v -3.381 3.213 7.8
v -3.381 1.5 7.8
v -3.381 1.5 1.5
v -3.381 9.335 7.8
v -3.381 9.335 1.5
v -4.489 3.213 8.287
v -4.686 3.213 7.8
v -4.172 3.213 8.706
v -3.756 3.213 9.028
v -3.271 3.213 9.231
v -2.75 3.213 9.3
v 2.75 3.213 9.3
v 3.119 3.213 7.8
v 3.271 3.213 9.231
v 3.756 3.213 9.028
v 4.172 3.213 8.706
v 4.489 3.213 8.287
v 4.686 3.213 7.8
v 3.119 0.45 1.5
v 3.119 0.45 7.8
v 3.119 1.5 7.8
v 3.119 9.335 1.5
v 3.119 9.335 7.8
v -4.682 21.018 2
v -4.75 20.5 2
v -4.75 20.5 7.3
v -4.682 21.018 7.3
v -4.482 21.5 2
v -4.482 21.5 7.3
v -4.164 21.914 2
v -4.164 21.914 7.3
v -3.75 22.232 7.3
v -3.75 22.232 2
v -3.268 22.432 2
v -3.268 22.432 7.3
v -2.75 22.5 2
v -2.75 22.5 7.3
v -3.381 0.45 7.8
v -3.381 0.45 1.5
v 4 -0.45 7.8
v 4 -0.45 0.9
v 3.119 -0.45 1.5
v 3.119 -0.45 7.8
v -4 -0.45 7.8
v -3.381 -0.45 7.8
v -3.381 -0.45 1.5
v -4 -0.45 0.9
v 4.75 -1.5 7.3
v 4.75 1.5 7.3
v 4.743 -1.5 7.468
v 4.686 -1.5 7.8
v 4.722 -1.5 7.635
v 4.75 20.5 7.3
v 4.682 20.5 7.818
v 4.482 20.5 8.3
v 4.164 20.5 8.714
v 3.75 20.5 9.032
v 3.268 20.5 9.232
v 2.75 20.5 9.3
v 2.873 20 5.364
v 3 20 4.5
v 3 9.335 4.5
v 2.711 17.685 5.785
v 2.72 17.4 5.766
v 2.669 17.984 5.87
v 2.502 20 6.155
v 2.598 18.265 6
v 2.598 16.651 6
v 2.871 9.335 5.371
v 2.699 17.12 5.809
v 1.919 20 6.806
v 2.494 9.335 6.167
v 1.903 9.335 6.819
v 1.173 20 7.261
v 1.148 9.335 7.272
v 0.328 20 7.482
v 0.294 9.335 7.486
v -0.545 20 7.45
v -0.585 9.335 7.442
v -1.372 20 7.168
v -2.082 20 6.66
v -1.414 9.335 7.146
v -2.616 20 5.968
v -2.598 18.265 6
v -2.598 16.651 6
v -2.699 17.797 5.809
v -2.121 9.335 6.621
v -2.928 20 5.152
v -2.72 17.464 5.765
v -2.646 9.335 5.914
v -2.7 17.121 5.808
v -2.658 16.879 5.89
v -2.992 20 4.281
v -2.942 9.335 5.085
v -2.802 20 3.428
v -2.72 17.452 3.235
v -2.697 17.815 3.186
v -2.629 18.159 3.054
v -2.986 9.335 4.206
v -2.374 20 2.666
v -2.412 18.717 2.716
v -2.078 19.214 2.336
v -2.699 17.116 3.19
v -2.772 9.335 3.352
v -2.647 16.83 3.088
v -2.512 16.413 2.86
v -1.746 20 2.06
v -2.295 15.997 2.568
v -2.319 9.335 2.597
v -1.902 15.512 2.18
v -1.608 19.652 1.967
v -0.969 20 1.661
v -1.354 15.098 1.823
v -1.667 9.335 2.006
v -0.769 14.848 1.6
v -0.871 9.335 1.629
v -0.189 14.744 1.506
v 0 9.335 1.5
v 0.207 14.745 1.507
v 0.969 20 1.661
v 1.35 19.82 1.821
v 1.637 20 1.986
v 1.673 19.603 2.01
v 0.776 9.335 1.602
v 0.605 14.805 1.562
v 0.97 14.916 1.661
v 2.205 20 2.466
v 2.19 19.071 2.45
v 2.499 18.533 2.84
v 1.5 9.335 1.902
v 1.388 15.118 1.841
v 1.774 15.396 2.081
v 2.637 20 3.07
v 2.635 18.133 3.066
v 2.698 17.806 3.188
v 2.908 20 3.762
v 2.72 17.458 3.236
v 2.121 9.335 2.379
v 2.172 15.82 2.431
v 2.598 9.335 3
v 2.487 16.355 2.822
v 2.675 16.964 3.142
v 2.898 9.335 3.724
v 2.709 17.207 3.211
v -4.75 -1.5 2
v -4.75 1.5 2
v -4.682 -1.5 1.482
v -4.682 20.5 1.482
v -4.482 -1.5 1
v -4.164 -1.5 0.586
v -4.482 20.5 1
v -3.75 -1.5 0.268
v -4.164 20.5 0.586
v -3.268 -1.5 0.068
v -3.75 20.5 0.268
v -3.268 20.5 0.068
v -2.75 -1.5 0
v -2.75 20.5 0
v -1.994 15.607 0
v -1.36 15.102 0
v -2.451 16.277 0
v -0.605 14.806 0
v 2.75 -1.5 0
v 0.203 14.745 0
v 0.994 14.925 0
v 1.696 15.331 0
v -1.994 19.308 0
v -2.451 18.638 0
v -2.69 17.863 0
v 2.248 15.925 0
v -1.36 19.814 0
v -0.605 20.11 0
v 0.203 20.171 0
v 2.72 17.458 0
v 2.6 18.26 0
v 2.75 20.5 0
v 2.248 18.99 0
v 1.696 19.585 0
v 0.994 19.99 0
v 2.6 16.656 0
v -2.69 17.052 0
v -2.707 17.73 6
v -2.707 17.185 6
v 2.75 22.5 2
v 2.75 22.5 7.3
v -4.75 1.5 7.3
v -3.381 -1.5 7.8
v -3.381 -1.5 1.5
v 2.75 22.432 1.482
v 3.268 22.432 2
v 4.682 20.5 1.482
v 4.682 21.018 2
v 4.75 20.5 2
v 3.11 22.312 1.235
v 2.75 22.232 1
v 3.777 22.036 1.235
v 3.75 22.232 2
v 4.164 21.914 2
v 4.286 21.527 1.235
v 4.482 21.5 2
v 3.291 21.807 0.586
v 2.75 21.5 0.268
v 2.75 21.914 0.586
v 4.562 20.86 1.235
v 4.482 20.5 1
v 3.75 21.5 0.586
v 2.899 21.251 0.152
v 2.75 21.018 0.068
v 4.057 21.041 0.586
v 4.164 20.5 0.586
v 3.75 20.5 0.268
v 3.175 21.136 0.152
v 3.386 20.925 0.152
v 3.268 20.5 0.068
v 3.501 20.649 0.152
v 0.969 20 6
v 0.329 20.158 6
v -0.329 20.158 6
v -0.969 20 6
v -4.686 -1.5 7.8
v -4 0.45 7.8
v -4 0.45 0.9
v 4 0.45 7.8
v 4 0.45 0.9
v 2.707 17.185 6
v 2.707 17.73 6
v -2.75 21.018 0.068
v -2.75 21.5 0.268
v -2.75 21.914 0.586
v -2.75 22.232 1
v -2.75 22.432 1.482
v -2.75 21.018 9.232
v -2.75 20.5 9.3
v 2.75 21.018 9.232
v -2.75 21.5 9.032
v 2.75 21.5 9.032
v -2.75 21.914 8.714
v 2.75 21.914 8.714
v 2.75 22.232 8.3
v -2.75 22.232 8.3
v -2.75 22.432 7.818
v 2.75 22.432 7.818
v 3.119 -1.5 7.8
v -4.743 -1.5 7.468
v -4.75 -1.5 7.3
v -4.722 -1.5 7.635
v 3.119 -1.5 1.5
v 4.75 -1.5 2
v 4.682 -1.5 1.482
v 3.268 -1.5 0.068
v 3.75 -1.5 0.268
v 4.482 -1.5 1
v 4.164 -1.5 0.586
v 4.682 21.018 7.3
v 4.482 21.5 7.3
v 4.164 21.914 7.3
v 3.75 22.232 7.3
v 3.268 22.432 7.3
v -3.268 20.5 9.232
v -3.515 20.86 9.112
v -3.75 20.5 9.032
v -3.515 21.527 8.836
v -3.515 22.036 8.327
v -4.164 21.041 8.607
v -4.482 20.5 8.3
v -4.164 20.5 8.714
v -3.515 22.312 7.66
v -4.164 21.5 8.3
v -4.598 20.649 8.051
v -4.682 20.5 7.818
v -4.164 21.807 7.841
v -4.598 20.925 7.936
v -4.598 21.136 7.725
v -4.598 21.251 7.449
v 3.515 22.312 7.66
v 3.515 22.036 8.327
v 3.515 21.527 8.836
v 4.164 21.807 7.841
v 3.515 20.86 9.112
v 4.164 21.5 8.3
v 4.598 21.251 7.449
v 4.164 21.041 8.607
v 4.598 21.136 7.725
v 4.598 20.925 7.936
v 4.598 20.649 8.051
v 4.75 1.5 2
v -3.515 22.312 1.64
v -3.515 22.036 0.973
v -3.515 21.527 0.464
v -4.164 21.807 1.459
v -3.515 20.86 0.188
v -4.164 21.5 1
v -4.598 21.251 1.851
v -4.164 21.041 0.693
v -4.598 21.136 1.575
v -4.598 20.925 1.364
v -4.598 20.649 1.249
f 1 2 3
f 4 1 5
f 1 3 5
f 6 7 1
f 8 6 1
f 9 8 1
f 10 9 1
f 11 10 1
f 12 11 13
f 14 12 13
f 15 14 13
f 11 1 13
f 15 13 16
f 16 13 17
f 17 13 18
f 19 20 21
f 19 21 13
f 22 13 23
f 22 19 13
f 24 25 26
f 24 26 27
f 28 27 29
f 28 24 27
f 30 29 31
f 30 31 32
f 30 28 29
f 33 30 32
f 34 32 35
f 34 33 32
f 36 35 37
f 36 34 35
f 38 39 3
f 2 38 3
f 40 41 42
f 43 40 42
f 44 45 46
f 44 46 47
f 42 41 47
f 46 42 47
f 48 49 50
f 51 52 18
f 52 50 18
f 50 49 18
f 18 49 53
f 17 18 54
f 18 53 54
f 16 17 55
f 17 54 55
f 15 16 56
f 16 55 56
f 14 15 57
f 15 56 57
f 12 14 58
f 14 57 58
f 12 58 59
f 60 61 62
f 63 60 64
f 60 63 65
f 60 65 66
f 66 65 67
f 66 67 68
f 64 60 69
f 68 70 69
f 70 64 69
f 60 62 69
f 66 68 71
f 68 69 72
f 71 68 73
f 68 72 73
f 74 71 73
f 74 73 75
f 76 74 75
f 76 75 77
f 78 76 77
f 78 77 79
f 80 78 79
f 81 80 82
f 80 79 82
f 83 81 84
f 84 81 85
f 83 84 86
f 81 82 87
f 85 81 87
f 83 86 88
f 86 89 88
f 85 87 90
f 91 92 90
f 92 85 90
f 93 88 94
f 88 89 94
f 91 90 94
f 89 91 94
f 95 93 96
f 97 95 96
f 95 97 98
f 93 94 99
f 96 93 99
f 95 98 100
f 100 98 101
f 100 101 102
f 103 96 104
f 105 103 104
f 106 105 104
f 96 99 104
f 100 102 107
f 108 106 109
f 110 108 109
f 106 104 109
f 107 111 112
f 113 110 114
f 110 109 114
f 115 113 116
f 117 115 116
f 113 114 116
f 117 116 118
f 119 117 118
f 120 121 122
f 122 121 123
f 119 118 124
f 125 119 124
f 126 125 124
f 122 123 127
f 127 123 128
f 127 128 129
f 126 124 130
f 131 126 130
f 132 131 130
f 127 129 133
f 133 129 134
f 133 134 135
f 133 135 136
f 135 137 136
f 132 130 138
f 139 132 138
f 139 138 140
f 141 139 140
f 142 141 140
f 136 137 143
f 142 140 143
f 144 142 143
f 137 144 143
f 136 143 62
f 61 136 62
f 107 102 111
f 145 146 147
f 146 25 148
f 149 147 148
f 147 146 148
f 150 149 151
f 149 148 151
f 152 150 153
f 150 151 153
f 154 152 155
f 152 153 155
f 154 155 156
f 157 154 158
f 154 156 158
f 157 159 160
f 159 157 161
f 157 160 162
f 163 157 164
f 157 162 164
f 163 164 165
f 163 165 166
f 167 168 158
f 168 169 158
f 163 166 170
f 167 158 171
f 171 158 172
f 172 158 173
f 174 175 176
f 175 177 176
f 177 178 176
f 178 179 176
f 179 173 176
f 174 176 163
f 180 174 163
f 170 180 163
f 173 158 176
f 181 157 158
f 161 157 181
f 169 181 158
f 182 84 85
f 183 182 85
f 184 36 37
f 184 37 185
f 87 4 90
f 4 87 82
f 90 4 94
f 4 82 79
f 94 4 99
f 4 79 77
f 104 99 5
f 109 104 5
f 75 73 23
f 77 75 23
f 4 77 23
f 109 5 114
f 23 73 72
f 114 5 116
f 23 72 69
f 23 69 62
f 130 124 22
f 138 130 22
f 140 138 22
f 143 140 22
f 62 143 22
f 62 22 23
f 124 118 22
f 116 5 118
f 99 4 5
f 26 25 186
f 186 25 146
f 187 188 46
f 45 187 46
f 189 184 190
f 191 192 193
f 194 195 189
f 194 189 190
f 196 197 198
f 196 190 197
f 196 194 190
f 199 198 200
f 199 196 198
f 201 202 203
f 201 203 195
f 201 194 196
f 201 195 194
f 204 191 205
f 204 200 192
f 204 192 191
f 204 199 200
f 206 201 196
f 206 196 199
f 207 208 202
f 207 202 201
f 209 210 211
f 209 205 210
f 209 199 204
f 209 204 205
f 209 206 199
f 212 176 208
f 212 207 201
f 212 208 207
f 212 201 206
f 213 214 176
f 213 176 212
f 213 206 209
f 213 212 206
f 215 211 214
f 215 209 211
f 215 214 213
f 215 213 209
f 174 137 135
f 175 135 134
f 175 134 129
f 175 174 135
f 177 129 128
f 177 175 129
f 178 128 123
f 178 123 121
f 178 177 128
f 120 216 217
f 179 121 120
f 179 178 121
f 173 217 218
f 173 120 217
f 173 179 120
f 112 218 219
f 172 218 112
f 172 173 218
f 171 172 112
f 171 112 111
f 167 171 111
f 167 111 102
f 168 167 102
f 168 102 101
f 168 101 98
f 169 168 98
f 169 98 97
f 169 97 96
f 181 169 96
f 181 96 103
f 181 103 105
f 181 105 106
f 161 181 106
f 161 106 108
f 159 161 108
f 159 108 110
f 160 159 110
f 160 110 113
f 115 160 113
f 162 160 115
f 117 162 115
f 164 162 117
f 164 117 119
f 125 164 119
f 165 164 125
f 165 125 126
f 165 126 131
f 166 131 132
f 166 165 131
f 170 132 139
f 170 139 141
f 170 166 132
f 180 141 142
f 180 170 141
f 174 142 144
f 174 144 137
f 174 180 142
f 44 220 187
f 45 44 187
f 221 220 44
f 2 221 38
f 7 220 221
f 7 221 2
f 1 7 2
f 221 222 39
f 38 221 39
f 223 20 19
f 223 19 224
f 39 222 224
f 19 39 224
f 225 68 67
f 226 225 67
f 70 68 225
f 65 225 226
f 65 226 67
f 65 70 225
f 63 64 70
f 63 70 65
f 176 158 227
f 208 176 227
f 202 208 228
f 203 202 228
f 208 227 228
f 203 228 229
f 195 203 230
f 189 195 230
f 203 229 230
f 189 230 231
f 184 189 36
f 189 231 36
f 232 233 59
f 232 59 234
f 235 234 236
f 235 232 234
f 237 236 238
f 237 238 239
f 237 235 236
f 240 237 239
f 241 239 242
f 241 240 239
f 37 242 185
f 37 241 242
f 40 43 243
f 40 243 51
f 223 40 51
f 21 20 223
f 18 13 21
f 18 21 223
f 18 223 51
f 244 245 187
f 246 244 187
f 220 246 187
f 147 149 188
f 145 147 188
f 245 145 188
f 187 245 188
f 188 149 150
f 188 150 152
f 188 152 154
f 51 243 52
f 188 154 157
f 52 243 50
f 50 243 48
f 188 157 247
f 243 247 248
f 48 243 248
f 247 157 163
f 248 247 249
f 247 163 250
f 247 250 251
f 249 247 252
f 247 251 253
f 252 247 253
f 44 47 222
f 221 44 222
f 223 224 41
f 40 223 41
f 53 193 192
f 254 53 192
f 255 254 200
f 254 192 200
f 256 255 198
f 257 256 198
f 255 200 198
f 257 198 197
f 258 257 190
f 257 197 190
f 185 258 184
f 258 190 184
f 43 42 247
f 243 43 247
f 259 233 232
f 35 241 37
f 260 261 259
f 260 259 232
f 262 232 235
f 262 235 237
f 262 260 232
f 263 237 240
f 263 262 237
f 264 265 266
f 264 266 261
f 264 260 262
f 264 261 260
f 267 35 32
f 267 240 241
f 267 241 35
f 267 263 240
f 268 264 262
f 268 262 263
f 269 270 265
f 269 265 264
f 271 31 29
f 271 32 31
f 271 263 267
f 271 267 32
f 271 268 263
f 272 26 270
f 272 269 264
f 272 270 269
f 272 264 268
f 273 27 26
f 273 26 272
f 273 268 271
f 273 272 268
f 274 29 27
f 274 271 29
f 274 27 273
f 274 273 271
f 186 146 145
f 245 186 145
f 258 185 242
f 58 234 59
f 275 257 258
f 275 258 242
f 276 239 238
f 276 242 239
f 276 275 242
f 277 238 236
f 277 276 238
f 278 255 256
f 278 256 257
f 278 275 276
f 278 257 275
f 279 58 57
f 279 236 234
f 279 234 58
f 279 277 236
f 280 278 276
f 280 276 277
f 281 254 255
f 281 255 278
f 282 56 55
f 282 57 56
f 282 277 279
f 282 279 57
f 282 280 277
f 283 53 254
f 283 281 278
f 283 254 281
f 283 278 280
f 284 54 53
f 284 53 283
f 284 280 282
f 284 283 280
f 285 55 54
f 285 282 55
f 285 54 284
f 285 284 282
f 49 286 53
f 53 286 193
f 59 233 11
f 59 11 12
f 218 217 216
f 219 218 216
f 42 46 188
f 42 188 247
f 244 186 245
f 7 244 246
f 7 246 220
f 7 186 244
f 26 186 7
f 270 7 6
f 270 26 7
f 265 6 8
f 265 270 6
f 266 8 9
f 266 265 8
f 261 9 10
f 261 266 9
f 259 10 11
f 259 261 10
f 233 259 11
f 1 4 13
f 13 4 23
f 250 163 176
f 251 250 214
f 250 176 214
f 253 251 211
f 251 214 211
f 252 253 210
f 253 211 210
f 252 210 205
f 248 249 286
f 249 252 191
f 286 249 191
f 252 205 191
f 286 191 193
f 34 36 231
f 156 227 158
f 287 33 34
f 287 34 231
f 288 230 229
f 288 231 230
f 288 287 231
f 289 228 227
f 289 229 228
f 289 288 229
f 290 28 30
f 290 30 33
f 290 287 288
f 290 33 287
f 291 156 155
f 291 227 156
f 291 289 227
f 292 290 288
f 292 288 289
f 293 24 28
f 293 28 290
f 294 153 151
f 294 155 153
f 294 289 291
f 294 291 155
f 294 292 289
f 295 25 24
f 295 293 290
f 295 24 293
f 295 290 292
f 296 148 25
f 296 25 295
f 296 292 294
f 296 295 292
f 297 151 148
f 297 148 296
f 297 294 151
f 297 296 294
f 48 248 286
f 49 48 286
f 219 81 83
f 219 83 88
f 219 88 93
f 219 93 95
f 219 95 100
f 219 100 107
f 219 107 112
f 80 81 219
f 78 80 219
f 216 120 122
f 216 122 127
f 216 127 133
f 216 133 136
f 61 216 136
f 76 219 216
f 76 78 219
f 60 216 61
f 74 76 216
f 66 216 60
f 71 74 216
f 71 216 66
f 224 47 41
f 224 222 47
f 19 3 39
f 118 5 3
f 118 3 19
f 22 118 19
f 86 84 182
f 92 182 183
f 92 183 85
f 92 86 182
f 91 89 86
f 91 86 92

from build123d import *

# Parameters (mm, degrees)
F0_W         = 1.3692331631
F0_H         = 7.834737435
F0_W_2       = 6.5
F0_H_2       = 0.9
F0_W_3       = 0.6192331631
F0_H_3       = 1.05
F0_H_4       = 13.165262565
F0_W_4       = 0.8807668369
F0_W_5       = 1.6307668369
F1_DEPTH     = 0.9
F2_DEPTH     = 1.5
F3_DEPTH     = 7.8
F5_W         = 9.5
F5_H         = 19.2867757659
F6_DEPTH     = 1.5
F7_R         = 3
F8_DEPTH     = 20
F9_T1_DEPTH  = 5.3
F9_T3_DEPTH  = 5.5
F9_T5_DEPTH  = 22.2867757659
F9_T7_DEPTH  = 27
F9_S11_W     = 2
F9_S11_H     = 2
F9_T12_DEPTH = 2
F9_S17_W     = 2
F9_S17_H     = 2
F9_T18_DEPTH = 2
F9_S23_W     = 2
F9_S23_H     = 2
F9_T24_DEPTH = 2
F9_S29_W     = 2
F9_S29_H     = 2
F9_T30_DEPTH = 2
F10_R        = 2.7204865104
F11_DEPTH    = 6


# Not quite as in the source:
# - a fillet or chamfer that OpenCascade refuses, or shapes differently, is made with other operations: its cross-section is extruded or revolved along the edge and cut away or added
# - a feature names something its author has since deleted; it is built from what else it names


with BuildPart() as f1:
    # F0 (on Top) → F1 (new body)
    with BuildSketch(Plane.XY):
        Polygon((-4.75, 1.5), (-4.75, -1.5), (-3.3807668369, -1.5), (-3.3807668369, -0.45), (-4, -0.45), (-4, 0.45), (-3.3807668369, 0.45), (-3.3807668369, 1.5), align=None)
        Polygon((-3.3807668369, -0.45), (-3.3807668369, -1.5), (-3.1192331631, -1.5), (3.1192331631, -1.5), (3.1192331631, -0.45), align=None)
        with Locations((-4.0653834185, 5.4173687175)):
            Rectangle(F0_W, F0_H)
        with Locations((-0.1307668369, 0)):
            Rectangle(F0_W_2, F0_H_2)
        with Locations((-3.6903834185, 0)):
            Rectangle(F0_W_3, F0_H_2)
        with Locations((-0.1307668369, 5.4173687175)):
            Rectangle(F0_W_2, F0_H)
        with Locations((-0.1307668369, 0.975)):
            Rectangle(F0_W_2, F0_H_3)
        with Locations((-4.0653834185, 15.9173687175)):
            Rectangle(F0_W, F0_H_4)
        Polygon((3.1192331631, -0.45), (3.1192331631, -1.5), (3.3807668369, -1.5), (4.75, -1.5), (4.75, 1.5), (3.1192331631, 1.5), (3.1192331631, 0.45), (4, 0.45), (4, -0.45), align=None)
        with Locations((3.5596165815, 0)):
            Rectangle(F0_W_4, F0_H_2)
        with Locations((3.9346165815, 5.4173687175)):
            Rectangle(F0_W_5, F0_H)
        with Locations((-0.1307668369, 15.9173687175)):
            Rectangle(F0_W_2, F0_H_4)
        with Locations((3.9346165815, 15.9173687175)):
            Rectangle(F0_W_5, F0_H_4)
    extrude(amount=F1_DEPTH)

    # F0 (on Top) → F2 (join)
    with BuildSketch(Plane.XY):
        Polygon((-3.3807668369, -0.45), (-3.3807668369, -1.5), (-3.1192331631, -1.5), (3.1192331631, -1.5), (3.1192331631, -0.45), align=None)
        Polygon((3.1192331631, -0.45), (3.1192331631, -1.5), (3.3807668369, -1.5), (4.75, -1.5), (4.75, 1.5), (3.1192331631, 1.5), (3.1192331631, 0.45), (4, 0.45), (4, -0.45), align=None)
        Polygon((-4.75, 1.5), (-4.75, -1.5), (-3.3807668369, -1.5), (-3.3807668369, -0.45), (-4, -0.45), (-4, 0.45), (-3.3807668369, 0.45), (-3.3807668369, 1.5), align=None)
        with Locations((-0.1307668369, 0.975)):
            Rectangle(F0_W_2, F0_H_3)
        with Locations((-4.0653834185, 5.4173687175)):
            Rectangle(F0_W, F0_H)
        with Locations((3.9346165815, 5.4173687175)):
            Rectangle(F0_W_5, F0_H)
        with Locations((-0.1307668369, 5.4173687175)):
            Rectangle(F0_W_2, F0_H)
        with Locations((-4.0653834185, 15.9173687175)):
            Rectangle(F0_W, F0_H_4)
        with Locations((-0.1307668369, 15.9173687175)):
            Rectangle(F0_W_2, F0_H_4)
        with Locations((3.9346165815, 15.9173687175)):
            Rectangle(F0_W_5, F0_H_4)
    extrude(amount=F2_DEPTH)

    # F0 (on Top) → F3 (join)
    with BuildSketch(Plane.XY):
        Polygon((-4.75, 1.5), (-4.75, -1.5), (-3.3807668369, -1.5), (-3.3807668369, -0.45), (-4, -0.45), (-4, 0.45), (-3.3807668369, 0.45), (-3.3807668369, 1.5), align=None)
        Polygon((3.1192331631, -0.45), (3.1192331631, -1.5), (3.3807668369, -1.5), (4.75, -1.5), (4.75, 1.5), (3.1192331631, 1.5), (3.1192331631, 0.45), (4, 0.45), (4, -0.45), align=None)
        with Locations((-4.0653834185, 5.4173687175)):
            Rectangle(F0_W, F0_H)
        with Locations((3.9346165815, 5.4173687175)):
            Rectangle(F0_W_5, F0_H)
        with Locations((-4.0653834185, 15.9173687175)):
            Rectangle(F0_W, F0_H_4)
        with Locations((-0.1307668369, 15.9173687175)):
            Rectangle(F0_W_2, F0_H_4)
        with Locations((3.9346165815, 15.9173687175)):
            Rectangle(F0_W_5, F0_H_4)
    extrude(amount=F3_DEPTH)

    # F5 (on offset) → F6 (join)
    with BuildSketch(Plane.XY.offset(7.8)):
        with Locations((0, 12.856612117)):
            Rectangle(F5_W, F5_H)
    extrude(amount=F6_DEPTH)

    # F7 (on Front) → F8 (cut)
    with BuildSketch(Plane.XZ):
        with Locations((0, 4.5)):
            Circle(F7_R)
    extrude(amount=-F8_DEPTH, mode=Mode.SUBTRACT)

    # F9: fillet of radius 2 on 8 edges, made by hand

    # F9_s2 → F9_t1 (cut)
    with BuildSketch(Plane.XY.offset(2)):
        with BuildLine():
            ThreePointArc((4.75, 20.5), (4.1642135624, 21.9142135624), (2.75, 22.5))
            Line((2.75, 22.5), (4.75, 22.5))
            Line((4.75, 22.5), (4.75, 20.5))
        make_face()
        with BuildLine():
            ThreePointArc((-4.75, 20.5), (-4.1642135624, 21.9142135624), (-2.75, 22.5))
            Line((-2.75, 22.5), (-4.75, 22.5))
            Line((-4.75, 22.5), (-4.75, 20.5))
        make_face()
    extrude(amount=F9_T1_DEPTH, mode=Mode.SUBTRACT)

    # F9_s4 → F9_t3 (cut)
    with BuildSketch(Plane.YZ.offset(-2.75)):
        with BuildLine():
            ThreePointArc((20.5, 9.3), (21.9142135624, 8.7142135624), (22.5, 7.3))
            Line((22.5, 7.3), (22.5, 9.3))
            Line((22.5, 9.3), (20.5, 9.3))
        make_face()
        with BuildLine():
            ThreePointArc((20.5, 0), (21.9142135624, 0.5857864376), (22.5, 2))
            Line((22.5, 2), (22.5, 0))
            Line((22.5, 0), (20.5, 0))
        make_face()
    extrude(amount=F9_T3_DEPTH, mode=Mode.SUBTRACT)

    # F9_s6 → F9_t5 (cut)
    with BuildSketch(Plane.XZ.offset(-20.5)):
        with BuildLine():
            ThreePointArc((4.75, 7.3), (4.1642135624, 8.7142135624), (2.75, 9.3))
            Line((2.75, 9.3), (4.75, 9.3))
            Line((4.75, 9.3), (4.75, 7.3))
        make_face()
        with BuildLine():
            ThreePointArc((-4.75, 7.3), (-4.1642135624, 8.7142135624), (-2.75, 9.3))
            Line((-2.75, 9.3), (-4.75, 9.3))
            Line((-4.75, 9.3), (-4.75, 7.3))
        make_face()
    extrude(amount=F9_T5_DEPTH, mode=Mode.SUBTRACT)

    # F9_s8 → F9_t7 (cut)
    with BuildSketch(Plane.XZ.offset(-20.5)):
        with BuildLine():
            ThreePointArc((2.75, 0), (4.1642135624, 0.5857864376), (4.75, 2))
            Line((4.75, 2), (4.75, 0))
            Line((4.75, 0), (2.75, 0))
        make_face()
        with BuildLine():
            ThreePointArc((-4.75, 2), (-4.1642135624, 0.5857864376), (-2.75, 0))
            Line((-2.75, 0), (-4.75, 0))
            Line((-4.75, 0), (-4.75, 2))
        make_face()
    extrude(amount=F9_T7_DEPTH, mode=Mode.SUBTRACT)


with BuildPart() as f9_tool10:
    # F9_s11 → F9_t12 (new body)
    with BuildSketch(Plane.YZ.offset(2.75)):
        with Locations((21.5, 8.3)):
            Rectangle(F9_S11_W, F9_S11_H)
    extrude(amount=F9_T12_DEPTH)

    # F9_s13 → F9_t14 (revolve, cut)
    with BuildSketch(Plane(origin=(2.75, 20.5, 7.3), x_dir=(0, -0.7071067812, -0.7071067812), z_dir=(0, -0.7071067812, 0.7071067812))):
        with BuildLine():
            ThreePointArc((0, -2), (2, 0), (0, 2))
            Line((0, 2), (0, -2))
        make_face()
    revolve(axis=Axis((2.75, 20.5, 7.3), (1, 0, 0)), mode=Mode.SUBTRACT)


with BuildPart() as f1_1:
    add(f1.part)

    # F9_t9: cut F9_tool10
    add(f9_tool10.part, mode=Mode.SUBTRACT)


with BuildPart() as f9_tool16:
    # F9_s17 → F9_t18 (new body)
    with BuildSketch(Plane.XY.offset(2)):
        with Locations((3.75, 21.5)):
            Rectangle(F9_S17_W, F9_S17_H)
    extrude(amount=-F9_T18_DEPTH)

    # F9_s19 → F9_t20 (revolve, cut)
    with BuildSketch(Plane(origin=(2.75, 20.5, 2), x_dir=(-0.7071067812, -0.7071067812, 0), z_dir=(0.7071067812, -0.7071067812, 0))):
        with BuildLine():
            ThreePointArc((0, -2), (2, 0), (0, 2))
            Line((0, 2), (0, -2))
        make_face()
    revolve(axis=Axis((2.75, 20.5, 2), (0, 0, -1)), mode=Mode.SUBTRACT)


with BuildPart() as f1_2:
    add(f1_1.part)

    # F9_t15: cut F9_tool16
    add(f9_tool16.part, mode=Mode.SUBTRACT)


with BuildPart() as f9_tool22:
    # F9_s23 → F9_t24 (new body)
    with BuildSketch(Plane.YZ.offset(-2.75)):
        with Locations((21.5, 8.3)):
            Rectangle(F9_S23_W, F9_S23_H)
    extrude(amount=-F9_T24_DEPTH)

    # F9_s25 → F9_t26 (revolve, cut)
    with BuildSketch(Plane(origin=(-2.75, 20.5, 7.3), x_dir=(0, -0.7071067812, -0.7071067812), z_dir=(0, 0.7071067812, -0.7071067812))):
        with BuildLine():
            ThreePointArc((0, -2), (2, 0), (0, 2))
            Line((0, 2), (0, -2))
        make_face()
    revolve(axis=Axis((-2.75, 20.5, 7.3), (-1, 0, 0)), mode=Mode.SUBTRACT)


with BuildPart() as f1_3:
    add(f1_2.part)

    # F9_t21: cut F9_tool22
    add(f9_tool22.part, mode=Mode.SUBTRACT)


with BuildPart() as f9_tool28:
    # F9_s29 → F9_t30 (new body)
    with BuildSketch(Plane.YZ.offset(-2.75)):
        with Locations((21.5, 1)):
            Rectangle(F9_S29_W, F9_S29_H)
    extrude(amount=-F9_T30_DEPTH)

    # F9_s31 → F9_t32 (revolve, cut)
    with BuildSketch(Plane(origin=(-2.75, 20.5, 2), x_dir=(0, -0.7071067812, 0.7071067812), z_dir=(0, -0.7071067812, -0.7071067812))):
        with BuildLine():
            ThreePointArc((0, -2), (2, 0), (0, 2))
            Line((0, 2), (0, -2))
        make_face()
    revolve(axis=Axis((-2.75, 20.5, 2), (-1, 0, 0)), mode=Mode.SUBTRACT)


with BuildPart() as f1_4:
    add(f1_3.part)

    # F9_t27: cut F9_tool28
    add(f9_tool28.part, mode=Mode.SUBTRACT)

    # F10 (on Top) → F11 (cut)
    with BuildSketch(Plane.XY):
        with Locations((0, 17.4578037113)):
            Circle(F10_R)
    extrude(amount=F11_DEPTH, mode=Mode.SUBTRACT)


solid = f1_4.part
